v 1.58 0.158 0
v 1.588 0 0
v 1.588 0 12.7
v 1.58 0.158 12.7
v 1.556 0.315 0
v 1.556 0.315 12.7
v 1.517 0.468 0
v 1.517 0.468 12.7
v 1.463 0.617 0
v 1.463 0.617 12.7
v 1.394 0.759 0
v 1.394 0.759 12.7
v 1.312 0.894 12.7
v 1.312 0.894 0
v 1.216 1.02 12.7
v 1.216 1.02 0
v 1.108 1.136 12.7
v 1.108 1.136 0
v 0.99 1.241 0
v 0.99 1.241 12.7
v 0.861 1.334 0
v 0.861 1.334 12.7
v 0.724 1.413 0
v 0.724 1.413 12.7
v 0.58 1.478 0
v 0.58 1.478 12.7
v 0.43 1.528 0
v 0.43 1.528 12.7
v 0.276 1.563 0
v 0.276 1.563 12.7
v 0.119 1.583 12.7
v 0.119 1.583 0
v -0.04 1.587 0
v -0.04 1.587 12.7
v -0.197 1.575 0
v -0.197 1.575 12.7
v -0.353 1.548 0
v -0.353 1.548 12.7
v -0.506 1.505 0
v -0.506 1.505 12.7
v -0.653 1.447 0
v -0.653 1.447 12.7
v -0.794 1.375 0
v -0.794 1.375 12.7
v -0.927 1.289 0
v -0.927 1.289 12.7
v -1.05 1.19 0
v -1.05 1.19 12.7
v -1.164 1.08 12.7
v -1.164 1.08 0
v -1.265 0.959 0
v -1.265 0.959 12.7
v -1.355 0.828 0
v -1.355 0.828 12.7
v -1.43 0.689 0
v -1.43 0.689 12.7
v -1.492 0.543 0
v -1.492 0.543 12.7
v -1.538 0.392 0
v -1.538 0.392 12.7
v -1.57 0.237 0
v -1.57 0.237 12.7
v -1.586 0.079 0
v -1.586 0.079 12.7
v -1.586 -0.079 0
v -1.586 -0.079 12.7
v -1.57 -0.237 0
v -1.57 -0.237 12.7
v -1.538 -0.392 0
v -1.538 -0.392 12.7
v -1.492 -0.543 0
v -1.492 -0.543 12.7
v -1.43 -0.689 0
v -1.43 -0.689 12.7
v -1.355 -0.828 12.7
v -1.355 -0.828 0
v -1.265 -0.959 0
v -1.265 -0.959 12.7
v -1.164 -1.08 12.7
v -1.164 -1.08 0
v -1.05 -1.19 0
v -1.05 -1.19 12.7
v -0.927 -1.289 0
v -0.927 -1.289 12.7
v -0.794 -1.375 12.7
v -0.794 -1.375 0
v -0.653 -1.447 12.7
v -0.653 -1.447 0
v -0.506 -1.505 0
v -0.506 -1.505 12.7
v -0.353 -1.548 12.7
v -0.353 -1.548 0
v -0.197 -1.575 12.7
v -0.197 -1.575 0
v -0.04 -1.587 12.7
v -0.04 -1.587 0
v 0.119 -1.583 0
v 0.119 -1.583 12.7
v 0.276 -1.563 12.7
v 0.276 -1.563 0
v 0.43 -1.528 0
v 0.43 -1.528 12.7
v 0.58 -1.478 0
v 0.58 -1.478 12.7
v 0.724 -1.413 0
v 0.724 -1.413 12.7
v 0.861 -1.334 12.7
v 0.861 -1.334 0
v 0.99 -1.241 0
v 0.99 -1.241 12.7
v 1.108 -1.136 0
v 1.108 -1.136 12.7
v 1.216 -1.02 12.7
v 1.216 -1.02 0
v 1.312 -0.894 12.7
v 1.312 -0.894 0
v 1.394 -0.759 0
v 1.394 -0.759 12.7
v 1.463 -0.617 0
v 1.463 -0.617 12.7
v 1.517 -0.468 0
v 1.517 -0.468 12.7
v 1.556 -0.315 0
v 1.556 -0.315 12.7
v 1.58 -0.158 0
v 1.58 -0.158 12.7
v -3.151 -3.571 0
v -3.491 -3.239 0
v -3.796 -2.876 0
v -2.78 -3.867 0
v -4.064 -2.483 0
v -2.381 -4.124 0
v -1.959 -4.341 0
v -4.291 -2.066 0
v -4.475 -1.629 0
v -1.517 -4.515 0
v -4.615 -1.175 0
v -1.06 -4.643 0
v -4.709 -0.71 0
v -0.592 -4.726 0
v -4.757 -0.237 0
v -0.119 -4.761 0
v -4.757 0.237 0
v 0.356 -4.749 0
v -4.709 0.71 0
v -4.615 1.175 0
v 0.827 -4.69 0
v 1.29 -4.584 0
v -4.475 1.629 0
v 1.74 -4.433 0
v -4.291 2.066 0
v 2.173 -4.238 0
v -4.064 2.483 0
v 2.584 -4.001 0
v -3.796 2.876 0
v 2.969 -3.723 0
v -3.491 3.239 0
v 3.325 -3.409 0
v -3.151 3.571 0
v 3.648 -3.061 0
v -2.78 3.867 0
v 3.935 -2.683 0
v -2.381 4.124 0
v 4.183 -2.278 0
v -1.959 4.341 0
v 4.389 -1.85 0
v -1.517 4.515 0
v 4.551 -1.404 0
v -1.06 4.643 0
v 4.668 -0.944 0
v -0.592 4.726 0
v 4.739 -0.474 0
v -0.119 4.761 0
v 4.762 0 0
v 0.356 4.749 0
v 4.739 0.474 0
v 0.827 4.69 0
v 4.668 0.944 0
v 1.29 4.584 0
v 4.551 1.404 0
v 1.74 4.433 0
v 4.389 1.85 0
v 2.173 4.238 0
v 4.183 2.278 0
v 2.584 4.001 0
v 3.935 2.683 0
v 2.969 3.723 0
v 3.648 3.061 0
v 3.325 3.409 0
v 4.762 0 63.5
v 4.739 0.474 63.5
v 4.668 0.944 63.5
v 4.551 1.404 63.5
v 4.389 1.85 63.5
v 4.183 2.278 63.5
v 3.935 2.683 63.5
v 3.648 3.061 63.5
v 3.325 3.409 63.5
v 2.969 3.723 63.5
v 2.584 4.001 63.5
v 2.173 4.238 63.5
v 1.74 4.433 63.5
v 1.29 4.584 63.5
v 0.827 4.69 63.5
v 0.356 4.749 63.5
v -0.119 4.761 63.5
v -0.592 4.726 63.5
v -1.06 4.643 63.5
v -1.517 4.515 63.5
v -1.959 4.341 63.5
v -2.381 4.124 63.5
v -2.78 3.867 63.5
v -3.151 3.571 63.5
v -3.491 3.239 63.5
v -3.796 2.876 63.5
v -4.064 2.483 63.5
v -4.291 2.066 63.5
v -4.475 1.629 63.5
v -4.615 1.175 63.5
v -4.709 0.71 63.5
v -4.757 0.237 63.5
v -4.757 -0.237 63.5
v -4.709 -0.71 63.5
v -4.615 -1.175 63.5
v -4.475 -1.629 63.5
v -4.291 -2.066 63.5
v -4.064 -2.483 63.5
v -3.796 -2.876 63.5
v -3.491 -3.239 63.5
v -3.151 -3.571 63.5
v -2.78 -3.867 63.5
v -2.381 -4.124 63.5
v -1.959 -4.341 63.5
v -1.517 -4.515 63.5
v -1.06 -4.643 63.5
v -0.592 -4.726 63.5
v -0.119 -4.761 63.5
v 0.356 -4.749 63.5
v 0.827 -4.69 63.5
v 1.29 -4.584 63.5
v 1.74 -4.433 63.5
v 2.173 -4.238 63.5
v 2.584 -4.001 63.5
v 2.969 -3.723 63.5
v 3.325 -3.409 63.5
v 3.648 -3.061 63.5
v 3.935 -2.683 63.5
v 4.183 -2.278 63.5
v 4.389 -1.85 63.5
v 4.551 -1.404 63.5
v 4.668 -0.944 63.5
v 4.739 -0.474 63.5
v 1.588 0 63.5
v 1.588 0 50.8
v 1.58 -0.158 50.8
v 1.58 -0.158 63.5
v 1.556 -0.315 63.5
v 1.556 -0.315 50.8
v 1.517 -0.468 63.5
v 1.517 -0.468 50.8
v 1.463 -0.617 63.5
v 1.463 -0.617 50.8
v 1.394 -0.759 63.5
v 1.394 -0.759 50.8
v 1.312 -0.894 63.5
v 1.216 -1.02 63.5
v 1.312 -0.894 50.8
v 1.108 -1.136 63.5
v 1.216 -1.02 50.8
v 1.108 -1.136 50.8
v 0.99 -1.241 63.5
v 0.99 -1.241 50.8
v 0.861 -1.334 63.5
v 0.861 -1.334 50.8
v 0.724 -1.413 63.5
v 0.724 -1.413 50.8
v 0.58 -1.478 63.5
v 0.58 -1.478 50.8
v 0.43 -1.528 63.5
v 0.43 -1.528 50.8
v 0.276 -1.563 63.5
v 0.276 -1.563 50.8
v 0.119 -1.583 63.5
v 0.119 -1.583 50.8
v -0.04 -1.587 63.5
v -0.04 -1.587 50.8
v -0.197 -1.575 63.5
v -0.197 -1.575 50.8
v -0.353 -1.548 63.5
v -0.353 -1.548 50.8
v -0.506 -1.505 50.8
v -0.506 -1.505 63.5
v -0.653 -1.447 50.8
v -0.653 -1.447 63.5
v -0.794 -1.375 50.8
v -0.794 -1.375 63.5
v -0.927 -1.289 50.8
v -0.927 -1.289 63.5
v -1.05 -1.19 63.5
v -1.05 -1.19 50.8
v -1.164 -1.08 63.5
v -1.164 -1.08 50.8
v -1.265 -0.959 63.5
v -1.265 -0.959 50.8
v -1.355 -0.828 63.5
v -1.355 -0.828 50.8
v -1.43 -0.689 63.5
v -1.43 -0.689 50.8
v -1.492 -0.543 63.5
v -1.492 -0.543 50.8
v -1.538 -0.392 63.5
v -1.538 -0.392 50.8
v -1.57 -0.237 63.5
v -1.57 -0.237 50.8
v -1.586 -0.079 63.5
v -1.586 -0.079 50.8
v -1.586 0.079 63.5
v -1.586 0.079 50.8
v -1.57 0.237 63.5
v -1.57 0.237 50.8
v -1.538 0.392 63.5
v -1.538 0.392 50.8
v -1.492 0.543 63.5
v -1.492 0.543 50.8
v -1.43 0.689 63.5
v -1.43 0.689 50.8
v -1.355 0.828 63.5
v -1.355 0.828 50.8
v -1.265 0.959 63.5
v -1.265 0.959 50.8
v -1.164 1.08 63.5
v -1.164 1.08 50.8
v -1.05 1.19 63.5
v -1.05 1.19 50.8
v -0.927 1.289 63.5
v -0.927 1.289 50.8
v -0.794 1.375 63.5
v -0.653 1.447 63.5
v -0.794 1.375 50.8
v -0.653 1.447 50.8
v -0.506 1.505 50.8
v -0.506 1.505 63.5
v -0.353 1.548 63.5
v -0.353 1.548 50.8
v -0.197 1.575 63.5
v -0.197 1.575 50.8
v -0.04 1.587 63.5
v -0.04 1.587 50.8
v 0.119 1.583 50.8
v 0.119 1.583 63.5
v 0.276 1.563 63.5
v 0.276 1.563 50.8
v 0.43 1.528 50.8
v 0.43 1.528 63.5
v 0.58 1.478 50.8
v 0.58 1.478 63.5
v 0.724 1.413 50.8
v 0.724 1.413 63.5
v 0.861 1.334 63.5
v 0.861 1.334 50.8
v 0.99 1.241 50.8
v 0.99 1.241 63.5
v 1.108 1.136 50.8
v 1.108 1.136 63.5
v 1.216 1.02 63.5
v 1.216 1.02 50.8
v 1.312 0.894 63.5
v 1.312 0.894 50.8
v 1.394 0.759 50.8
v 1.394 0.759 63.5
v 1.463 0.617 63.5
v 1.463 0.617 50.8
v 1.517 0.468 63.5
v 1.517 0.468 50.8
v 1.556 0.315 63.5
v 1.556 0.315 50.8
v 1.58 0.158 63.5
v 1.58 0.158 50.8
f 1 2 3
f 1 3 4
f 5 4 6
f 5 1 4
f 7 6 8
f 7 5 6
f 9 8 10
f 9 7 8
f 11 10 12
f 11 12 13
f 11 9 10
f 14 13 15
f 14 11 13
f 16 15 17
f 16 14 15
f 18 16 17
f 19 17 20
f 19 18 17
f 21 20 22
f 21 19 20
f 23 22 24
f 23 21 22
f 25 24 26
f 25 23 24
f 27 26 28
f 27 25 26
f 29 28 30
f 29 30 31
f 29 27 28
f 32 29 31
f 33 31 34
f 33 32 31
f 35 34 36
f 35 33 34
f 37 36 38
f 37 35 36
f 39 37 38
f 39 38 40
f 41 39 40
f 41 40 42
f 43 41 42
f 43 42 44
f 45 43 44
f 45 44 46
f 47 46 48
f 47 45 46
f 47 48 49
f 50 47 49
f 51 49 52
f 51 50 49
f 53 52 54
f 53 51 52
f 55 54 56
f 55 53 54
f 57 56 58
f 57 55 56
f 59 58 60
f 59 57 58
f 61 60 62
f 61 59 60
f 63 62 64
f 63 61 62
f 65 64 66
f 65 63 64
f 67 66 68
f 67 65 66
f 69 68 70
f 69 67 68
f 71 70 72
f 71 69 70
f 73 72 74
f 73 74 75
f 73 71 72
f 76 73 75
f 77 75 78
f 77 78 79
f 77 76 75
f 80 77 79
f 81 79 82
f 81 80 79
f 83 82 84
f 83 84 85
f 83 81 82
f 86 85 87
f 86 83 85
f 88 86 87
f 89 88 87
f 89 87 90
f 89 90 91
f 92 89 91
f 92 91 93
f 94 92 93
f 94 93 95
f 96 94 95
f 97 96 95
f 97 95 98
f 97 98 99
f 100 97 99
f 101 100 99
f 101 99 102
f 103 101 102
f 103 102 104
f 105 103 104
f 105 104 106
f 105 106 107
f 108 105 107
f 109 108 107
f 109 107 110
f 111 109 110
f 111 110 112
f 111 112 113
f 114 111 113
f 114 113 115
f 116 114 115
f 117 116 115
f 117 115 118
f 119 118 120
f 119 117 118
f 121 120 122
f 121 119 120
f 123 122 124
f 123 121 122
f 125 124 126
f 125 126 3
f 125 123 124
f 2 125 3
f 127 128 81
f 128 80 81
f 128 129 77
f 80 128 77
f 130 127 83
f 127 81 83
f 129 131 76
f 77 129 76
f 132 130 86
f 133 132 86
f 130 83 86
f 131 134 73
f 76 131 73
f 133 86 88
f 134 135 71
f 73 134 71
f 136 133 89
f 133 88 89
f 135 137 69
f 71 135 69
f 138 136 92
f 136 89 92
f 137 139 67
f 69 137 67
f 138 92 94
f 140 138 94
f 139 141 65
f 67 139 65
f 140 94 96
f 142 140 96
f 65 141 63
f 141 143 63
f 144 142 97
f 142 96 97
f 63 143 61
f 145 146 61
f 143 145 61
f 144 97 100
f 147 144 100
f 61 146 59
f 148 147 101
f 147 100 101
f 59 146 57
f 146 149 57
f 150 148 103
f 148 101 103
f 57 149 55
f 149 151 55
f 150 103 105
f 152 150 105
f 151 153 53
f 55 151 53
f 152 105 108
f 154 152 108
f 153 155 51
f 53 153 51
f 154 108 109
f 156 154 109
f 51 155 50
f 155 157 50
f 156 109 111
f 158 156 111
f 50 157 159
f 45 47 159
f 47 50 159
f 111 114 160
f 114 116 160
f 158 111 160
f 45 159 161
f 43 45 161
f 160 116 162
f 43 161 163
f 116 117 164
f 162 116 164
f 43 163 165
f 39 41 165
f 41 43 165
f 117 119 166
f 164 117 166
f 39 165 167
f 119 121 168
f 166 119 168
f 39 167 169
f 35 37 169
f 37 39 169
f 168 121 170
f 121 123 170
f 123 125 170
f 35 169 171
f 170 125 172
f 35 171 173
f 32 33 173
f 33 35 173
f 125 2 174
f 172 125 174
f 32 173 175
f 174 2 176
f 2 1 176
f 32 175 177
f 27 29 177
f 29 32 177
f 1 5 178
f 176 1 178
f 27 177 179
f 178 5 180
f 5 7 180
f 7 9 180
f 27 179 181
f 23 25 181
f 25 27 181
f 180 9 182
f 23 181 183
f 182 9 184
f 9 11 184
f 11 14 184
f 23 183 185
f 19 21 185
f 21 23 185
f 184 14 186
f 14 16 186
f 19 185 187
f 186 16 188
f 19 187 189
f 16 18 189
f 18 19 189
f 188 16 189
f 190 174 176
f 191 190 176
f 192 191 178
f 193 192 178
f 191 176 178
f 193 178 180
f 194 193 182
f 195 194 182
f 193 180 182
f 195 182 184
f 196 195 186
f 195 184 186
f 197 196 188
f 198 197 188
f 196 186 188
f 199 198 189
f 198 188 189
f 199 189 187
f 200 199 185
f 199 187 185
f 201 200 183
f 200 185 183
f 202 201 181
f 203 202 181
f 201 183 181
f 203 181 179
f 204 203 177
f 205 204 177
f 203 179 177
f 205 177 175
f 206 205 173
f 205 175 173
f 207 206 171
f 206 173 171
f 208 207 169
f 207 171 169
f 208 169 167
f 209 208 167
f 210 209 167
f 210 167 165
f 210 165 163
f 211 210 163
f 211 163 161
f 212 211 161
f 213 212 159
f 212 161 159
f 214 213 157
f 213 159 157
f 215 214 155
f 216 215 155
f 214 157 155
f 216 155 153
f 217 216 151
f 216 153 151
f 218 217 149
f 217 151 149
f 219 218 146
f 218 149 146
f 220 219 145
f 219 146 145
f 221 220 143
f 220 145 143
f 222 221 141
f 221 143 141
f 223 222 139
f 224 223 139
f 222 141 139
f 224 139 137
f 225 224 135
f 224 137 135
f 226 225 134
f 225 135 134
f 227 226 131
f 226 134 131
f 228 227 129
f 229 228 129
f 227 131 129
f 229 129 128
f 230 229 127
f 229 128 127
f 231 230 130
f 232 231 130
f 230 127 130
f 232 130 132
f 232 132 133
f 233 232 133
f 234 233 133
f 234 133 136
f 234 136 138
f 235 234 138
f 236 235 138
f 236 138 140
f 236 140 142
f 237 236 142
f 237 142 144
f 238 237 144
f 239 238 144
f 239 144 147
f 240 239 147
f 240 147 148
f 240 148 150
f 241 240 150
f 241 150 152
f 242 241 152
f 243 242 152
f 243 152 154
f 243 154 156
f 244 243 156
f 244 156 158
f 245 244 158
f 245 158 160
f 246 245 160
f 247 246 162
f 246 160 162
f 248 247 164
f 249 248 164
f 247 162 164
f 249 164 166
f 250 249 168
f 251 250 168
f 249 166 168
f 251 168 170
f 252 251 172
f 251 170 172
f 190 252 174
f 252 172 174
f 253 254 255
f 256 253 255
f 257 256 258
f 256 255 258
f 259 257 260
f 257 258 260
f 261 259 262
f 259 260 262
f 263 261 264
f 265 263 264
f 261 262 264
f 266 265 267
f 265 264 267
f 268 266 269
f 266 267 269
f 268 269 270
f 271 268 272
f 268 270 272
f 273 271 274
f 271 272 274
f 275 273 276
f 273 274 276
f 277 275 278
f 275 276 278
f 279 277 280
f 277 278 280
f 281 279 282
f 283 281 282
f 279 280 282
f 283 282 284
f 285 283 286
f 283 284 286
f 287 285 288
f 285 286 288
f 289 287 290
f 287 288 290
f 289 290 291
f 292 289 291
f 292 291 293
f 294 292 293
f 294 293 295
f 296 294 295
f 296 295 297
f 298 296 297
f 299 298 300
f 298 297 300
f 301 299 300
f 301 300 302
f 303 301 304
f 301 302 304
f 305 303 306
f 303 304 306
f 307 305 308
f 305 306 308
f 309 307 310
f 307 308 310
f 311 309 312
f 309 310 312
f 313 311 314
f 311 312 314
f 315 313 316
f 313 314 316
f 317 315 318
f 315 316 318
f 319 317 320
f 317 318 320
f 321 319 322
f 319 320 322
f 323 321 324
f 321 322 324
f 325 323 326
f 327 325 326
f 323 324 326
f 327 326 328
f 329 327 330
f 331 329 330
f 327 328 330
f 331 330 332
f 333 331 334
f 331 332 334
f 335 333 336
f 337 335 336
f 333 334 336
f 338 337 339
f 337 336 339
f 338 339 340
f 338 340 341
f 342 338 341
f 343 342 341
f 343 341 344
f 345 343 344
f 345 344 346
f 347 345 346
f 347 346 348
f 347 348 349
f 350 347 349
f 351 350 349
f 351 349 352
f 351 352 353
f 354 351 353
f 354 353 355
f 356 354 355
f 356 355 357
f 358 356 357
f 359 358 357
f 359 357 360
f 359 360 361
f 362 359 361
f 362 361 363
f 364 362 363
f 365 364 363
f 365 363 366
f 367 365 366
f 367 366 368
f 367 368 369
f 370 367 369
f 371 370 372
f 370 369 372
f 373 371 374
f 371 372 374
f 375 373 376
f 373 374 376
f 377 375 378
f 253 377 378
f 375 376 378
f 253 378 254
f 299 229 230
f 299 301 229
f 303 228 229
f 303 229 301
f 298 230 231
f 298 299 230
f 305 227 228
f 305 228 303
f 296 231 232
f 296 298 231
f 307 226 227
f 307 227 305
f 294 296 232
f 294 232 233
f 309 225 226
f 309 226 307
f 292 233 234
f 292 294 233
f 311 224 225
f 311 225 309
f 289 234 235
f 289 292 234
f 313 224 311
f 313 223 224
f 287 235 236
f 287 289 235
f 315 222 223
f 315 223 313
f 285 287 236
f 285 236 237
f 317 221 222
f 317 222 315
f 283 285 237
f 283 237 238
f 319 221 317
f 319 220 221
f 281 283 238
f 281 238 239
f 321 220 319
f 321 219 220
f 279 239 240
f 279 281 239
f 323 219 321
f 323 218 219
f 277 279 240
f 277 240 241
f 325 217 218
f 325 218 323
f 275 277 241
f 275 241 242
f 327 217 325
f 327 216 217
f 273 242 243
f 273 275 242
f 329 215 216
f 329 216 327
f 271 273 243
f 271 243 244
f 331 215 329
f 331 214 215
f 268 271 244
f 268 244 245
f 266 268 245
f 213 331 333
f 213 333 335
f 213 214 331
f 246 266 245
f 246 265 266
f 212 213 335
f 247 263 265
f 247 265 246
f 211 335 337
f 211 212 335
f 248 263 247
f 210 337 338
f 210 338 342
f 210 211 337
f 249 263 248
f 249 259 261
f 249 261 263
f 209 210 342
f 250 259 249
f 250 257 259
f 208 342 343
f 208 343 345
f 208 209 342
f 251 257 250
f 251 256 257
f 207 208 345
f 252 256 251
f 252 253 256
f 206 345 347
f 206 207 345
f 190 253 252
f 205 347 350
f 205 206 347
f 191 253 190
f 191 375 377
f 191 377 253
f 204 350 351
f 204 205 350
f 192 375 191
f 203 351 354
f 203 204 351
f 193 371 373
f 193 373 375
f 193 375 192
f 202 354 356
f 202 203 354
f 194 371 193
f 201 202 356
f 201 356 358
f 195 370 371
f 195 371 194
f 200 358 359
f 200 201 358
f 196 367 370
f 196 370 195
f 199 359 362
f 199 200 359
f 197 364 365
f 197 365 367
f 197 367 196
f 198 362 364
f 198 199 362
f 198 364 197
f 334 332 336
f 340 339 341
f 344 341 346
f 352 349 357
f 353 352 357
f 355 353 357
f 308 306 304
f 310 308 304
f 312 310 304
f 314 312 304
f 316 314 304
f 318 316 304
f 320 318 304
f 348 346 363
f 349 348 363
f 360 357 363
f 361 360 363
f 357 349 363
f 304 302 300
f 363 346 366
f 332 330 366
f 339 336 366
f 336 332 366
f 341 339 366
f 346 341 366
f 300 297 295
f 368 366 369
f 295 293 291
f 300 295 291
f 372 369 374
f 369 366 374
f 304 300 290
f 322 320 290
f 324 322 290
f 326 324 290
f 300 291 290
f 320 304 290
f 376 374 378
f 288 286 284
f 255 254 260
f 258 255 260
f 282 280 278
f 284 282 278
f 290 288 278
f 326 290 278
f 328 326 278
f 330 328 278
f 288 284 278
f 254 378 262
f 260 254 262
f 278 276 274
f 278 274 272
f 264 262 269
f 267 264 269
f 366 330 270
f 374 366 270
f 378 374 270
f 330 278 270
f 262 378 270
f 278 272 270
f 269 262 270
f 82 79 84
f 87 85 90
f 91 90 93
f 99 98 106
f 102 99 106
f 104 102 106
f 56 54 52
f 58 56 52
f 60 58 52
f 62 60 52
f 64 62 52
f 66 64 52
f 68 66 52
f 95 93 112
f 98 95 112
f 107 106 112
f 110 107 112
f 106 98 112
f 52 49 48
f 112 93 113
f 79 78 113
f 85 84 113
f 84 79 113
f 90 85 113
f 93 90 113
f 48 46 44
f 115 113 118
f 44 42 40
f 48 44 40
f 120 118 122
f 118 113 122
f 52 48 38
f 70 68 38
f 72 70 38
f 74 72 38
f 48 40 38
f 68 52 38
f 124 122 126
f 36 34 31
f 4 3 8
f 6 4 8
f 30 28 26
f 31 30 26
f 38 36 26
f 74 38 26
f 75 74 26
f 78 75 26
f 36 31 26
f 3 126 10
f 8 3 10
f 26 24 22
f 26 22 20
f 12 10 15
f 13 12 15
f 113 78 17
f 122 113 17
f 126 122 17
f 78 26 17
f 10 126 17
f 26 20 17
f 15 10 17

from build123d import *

# Parameters (mm, degrees)
SKETCH1_R           = 4.7625
BOSS_EXTRUDE2_DEPTH = 63.5
SKETCH5_R           = 1.5875
CUT_EXTRUDE1_DEPTH  = 12.7
CUT_EXTRUDE2_START  = 12.7
SKETCH6_R           = 1.5875
CUT_EXTRUDE2_DEPTH  = 12.7


with BuildPart() as part:
    # Sketch1 → Boss-Extrude2 (new body)
    with BuildSketch(Plane.XY):
        Circle(SKETCH1_R)
    extrude(amount=BOSS_EXTRUDE2_DEPTH)

    # Sketch5 → Cut-Extrude1 (cut)
    with BuildSketch(Plane.XY):
        Circle(SKETCH5_R)
    extrude(amount=CUT_EXTRUDE1_DEPTH, mode=Mode.SUBTRACT)

    # Sketch6 → Cut-Extrude2 (cut)
    with BuildSketch(Plane(origin=(0, 0, 63.5), x_dir=(-1, 0, 0), z_dir=(0, 0, -1)).offset(CUT_EXTRUDE2_START)):
        with Locations(Location((0, 0, 0), (0, 0, 180))):
            Circle(SKETCH6_R)
    extrude(amount=-CUT_EXTRUDE2_DEPTH, mode=Mode.SUBTRACT)


solid = part.part
